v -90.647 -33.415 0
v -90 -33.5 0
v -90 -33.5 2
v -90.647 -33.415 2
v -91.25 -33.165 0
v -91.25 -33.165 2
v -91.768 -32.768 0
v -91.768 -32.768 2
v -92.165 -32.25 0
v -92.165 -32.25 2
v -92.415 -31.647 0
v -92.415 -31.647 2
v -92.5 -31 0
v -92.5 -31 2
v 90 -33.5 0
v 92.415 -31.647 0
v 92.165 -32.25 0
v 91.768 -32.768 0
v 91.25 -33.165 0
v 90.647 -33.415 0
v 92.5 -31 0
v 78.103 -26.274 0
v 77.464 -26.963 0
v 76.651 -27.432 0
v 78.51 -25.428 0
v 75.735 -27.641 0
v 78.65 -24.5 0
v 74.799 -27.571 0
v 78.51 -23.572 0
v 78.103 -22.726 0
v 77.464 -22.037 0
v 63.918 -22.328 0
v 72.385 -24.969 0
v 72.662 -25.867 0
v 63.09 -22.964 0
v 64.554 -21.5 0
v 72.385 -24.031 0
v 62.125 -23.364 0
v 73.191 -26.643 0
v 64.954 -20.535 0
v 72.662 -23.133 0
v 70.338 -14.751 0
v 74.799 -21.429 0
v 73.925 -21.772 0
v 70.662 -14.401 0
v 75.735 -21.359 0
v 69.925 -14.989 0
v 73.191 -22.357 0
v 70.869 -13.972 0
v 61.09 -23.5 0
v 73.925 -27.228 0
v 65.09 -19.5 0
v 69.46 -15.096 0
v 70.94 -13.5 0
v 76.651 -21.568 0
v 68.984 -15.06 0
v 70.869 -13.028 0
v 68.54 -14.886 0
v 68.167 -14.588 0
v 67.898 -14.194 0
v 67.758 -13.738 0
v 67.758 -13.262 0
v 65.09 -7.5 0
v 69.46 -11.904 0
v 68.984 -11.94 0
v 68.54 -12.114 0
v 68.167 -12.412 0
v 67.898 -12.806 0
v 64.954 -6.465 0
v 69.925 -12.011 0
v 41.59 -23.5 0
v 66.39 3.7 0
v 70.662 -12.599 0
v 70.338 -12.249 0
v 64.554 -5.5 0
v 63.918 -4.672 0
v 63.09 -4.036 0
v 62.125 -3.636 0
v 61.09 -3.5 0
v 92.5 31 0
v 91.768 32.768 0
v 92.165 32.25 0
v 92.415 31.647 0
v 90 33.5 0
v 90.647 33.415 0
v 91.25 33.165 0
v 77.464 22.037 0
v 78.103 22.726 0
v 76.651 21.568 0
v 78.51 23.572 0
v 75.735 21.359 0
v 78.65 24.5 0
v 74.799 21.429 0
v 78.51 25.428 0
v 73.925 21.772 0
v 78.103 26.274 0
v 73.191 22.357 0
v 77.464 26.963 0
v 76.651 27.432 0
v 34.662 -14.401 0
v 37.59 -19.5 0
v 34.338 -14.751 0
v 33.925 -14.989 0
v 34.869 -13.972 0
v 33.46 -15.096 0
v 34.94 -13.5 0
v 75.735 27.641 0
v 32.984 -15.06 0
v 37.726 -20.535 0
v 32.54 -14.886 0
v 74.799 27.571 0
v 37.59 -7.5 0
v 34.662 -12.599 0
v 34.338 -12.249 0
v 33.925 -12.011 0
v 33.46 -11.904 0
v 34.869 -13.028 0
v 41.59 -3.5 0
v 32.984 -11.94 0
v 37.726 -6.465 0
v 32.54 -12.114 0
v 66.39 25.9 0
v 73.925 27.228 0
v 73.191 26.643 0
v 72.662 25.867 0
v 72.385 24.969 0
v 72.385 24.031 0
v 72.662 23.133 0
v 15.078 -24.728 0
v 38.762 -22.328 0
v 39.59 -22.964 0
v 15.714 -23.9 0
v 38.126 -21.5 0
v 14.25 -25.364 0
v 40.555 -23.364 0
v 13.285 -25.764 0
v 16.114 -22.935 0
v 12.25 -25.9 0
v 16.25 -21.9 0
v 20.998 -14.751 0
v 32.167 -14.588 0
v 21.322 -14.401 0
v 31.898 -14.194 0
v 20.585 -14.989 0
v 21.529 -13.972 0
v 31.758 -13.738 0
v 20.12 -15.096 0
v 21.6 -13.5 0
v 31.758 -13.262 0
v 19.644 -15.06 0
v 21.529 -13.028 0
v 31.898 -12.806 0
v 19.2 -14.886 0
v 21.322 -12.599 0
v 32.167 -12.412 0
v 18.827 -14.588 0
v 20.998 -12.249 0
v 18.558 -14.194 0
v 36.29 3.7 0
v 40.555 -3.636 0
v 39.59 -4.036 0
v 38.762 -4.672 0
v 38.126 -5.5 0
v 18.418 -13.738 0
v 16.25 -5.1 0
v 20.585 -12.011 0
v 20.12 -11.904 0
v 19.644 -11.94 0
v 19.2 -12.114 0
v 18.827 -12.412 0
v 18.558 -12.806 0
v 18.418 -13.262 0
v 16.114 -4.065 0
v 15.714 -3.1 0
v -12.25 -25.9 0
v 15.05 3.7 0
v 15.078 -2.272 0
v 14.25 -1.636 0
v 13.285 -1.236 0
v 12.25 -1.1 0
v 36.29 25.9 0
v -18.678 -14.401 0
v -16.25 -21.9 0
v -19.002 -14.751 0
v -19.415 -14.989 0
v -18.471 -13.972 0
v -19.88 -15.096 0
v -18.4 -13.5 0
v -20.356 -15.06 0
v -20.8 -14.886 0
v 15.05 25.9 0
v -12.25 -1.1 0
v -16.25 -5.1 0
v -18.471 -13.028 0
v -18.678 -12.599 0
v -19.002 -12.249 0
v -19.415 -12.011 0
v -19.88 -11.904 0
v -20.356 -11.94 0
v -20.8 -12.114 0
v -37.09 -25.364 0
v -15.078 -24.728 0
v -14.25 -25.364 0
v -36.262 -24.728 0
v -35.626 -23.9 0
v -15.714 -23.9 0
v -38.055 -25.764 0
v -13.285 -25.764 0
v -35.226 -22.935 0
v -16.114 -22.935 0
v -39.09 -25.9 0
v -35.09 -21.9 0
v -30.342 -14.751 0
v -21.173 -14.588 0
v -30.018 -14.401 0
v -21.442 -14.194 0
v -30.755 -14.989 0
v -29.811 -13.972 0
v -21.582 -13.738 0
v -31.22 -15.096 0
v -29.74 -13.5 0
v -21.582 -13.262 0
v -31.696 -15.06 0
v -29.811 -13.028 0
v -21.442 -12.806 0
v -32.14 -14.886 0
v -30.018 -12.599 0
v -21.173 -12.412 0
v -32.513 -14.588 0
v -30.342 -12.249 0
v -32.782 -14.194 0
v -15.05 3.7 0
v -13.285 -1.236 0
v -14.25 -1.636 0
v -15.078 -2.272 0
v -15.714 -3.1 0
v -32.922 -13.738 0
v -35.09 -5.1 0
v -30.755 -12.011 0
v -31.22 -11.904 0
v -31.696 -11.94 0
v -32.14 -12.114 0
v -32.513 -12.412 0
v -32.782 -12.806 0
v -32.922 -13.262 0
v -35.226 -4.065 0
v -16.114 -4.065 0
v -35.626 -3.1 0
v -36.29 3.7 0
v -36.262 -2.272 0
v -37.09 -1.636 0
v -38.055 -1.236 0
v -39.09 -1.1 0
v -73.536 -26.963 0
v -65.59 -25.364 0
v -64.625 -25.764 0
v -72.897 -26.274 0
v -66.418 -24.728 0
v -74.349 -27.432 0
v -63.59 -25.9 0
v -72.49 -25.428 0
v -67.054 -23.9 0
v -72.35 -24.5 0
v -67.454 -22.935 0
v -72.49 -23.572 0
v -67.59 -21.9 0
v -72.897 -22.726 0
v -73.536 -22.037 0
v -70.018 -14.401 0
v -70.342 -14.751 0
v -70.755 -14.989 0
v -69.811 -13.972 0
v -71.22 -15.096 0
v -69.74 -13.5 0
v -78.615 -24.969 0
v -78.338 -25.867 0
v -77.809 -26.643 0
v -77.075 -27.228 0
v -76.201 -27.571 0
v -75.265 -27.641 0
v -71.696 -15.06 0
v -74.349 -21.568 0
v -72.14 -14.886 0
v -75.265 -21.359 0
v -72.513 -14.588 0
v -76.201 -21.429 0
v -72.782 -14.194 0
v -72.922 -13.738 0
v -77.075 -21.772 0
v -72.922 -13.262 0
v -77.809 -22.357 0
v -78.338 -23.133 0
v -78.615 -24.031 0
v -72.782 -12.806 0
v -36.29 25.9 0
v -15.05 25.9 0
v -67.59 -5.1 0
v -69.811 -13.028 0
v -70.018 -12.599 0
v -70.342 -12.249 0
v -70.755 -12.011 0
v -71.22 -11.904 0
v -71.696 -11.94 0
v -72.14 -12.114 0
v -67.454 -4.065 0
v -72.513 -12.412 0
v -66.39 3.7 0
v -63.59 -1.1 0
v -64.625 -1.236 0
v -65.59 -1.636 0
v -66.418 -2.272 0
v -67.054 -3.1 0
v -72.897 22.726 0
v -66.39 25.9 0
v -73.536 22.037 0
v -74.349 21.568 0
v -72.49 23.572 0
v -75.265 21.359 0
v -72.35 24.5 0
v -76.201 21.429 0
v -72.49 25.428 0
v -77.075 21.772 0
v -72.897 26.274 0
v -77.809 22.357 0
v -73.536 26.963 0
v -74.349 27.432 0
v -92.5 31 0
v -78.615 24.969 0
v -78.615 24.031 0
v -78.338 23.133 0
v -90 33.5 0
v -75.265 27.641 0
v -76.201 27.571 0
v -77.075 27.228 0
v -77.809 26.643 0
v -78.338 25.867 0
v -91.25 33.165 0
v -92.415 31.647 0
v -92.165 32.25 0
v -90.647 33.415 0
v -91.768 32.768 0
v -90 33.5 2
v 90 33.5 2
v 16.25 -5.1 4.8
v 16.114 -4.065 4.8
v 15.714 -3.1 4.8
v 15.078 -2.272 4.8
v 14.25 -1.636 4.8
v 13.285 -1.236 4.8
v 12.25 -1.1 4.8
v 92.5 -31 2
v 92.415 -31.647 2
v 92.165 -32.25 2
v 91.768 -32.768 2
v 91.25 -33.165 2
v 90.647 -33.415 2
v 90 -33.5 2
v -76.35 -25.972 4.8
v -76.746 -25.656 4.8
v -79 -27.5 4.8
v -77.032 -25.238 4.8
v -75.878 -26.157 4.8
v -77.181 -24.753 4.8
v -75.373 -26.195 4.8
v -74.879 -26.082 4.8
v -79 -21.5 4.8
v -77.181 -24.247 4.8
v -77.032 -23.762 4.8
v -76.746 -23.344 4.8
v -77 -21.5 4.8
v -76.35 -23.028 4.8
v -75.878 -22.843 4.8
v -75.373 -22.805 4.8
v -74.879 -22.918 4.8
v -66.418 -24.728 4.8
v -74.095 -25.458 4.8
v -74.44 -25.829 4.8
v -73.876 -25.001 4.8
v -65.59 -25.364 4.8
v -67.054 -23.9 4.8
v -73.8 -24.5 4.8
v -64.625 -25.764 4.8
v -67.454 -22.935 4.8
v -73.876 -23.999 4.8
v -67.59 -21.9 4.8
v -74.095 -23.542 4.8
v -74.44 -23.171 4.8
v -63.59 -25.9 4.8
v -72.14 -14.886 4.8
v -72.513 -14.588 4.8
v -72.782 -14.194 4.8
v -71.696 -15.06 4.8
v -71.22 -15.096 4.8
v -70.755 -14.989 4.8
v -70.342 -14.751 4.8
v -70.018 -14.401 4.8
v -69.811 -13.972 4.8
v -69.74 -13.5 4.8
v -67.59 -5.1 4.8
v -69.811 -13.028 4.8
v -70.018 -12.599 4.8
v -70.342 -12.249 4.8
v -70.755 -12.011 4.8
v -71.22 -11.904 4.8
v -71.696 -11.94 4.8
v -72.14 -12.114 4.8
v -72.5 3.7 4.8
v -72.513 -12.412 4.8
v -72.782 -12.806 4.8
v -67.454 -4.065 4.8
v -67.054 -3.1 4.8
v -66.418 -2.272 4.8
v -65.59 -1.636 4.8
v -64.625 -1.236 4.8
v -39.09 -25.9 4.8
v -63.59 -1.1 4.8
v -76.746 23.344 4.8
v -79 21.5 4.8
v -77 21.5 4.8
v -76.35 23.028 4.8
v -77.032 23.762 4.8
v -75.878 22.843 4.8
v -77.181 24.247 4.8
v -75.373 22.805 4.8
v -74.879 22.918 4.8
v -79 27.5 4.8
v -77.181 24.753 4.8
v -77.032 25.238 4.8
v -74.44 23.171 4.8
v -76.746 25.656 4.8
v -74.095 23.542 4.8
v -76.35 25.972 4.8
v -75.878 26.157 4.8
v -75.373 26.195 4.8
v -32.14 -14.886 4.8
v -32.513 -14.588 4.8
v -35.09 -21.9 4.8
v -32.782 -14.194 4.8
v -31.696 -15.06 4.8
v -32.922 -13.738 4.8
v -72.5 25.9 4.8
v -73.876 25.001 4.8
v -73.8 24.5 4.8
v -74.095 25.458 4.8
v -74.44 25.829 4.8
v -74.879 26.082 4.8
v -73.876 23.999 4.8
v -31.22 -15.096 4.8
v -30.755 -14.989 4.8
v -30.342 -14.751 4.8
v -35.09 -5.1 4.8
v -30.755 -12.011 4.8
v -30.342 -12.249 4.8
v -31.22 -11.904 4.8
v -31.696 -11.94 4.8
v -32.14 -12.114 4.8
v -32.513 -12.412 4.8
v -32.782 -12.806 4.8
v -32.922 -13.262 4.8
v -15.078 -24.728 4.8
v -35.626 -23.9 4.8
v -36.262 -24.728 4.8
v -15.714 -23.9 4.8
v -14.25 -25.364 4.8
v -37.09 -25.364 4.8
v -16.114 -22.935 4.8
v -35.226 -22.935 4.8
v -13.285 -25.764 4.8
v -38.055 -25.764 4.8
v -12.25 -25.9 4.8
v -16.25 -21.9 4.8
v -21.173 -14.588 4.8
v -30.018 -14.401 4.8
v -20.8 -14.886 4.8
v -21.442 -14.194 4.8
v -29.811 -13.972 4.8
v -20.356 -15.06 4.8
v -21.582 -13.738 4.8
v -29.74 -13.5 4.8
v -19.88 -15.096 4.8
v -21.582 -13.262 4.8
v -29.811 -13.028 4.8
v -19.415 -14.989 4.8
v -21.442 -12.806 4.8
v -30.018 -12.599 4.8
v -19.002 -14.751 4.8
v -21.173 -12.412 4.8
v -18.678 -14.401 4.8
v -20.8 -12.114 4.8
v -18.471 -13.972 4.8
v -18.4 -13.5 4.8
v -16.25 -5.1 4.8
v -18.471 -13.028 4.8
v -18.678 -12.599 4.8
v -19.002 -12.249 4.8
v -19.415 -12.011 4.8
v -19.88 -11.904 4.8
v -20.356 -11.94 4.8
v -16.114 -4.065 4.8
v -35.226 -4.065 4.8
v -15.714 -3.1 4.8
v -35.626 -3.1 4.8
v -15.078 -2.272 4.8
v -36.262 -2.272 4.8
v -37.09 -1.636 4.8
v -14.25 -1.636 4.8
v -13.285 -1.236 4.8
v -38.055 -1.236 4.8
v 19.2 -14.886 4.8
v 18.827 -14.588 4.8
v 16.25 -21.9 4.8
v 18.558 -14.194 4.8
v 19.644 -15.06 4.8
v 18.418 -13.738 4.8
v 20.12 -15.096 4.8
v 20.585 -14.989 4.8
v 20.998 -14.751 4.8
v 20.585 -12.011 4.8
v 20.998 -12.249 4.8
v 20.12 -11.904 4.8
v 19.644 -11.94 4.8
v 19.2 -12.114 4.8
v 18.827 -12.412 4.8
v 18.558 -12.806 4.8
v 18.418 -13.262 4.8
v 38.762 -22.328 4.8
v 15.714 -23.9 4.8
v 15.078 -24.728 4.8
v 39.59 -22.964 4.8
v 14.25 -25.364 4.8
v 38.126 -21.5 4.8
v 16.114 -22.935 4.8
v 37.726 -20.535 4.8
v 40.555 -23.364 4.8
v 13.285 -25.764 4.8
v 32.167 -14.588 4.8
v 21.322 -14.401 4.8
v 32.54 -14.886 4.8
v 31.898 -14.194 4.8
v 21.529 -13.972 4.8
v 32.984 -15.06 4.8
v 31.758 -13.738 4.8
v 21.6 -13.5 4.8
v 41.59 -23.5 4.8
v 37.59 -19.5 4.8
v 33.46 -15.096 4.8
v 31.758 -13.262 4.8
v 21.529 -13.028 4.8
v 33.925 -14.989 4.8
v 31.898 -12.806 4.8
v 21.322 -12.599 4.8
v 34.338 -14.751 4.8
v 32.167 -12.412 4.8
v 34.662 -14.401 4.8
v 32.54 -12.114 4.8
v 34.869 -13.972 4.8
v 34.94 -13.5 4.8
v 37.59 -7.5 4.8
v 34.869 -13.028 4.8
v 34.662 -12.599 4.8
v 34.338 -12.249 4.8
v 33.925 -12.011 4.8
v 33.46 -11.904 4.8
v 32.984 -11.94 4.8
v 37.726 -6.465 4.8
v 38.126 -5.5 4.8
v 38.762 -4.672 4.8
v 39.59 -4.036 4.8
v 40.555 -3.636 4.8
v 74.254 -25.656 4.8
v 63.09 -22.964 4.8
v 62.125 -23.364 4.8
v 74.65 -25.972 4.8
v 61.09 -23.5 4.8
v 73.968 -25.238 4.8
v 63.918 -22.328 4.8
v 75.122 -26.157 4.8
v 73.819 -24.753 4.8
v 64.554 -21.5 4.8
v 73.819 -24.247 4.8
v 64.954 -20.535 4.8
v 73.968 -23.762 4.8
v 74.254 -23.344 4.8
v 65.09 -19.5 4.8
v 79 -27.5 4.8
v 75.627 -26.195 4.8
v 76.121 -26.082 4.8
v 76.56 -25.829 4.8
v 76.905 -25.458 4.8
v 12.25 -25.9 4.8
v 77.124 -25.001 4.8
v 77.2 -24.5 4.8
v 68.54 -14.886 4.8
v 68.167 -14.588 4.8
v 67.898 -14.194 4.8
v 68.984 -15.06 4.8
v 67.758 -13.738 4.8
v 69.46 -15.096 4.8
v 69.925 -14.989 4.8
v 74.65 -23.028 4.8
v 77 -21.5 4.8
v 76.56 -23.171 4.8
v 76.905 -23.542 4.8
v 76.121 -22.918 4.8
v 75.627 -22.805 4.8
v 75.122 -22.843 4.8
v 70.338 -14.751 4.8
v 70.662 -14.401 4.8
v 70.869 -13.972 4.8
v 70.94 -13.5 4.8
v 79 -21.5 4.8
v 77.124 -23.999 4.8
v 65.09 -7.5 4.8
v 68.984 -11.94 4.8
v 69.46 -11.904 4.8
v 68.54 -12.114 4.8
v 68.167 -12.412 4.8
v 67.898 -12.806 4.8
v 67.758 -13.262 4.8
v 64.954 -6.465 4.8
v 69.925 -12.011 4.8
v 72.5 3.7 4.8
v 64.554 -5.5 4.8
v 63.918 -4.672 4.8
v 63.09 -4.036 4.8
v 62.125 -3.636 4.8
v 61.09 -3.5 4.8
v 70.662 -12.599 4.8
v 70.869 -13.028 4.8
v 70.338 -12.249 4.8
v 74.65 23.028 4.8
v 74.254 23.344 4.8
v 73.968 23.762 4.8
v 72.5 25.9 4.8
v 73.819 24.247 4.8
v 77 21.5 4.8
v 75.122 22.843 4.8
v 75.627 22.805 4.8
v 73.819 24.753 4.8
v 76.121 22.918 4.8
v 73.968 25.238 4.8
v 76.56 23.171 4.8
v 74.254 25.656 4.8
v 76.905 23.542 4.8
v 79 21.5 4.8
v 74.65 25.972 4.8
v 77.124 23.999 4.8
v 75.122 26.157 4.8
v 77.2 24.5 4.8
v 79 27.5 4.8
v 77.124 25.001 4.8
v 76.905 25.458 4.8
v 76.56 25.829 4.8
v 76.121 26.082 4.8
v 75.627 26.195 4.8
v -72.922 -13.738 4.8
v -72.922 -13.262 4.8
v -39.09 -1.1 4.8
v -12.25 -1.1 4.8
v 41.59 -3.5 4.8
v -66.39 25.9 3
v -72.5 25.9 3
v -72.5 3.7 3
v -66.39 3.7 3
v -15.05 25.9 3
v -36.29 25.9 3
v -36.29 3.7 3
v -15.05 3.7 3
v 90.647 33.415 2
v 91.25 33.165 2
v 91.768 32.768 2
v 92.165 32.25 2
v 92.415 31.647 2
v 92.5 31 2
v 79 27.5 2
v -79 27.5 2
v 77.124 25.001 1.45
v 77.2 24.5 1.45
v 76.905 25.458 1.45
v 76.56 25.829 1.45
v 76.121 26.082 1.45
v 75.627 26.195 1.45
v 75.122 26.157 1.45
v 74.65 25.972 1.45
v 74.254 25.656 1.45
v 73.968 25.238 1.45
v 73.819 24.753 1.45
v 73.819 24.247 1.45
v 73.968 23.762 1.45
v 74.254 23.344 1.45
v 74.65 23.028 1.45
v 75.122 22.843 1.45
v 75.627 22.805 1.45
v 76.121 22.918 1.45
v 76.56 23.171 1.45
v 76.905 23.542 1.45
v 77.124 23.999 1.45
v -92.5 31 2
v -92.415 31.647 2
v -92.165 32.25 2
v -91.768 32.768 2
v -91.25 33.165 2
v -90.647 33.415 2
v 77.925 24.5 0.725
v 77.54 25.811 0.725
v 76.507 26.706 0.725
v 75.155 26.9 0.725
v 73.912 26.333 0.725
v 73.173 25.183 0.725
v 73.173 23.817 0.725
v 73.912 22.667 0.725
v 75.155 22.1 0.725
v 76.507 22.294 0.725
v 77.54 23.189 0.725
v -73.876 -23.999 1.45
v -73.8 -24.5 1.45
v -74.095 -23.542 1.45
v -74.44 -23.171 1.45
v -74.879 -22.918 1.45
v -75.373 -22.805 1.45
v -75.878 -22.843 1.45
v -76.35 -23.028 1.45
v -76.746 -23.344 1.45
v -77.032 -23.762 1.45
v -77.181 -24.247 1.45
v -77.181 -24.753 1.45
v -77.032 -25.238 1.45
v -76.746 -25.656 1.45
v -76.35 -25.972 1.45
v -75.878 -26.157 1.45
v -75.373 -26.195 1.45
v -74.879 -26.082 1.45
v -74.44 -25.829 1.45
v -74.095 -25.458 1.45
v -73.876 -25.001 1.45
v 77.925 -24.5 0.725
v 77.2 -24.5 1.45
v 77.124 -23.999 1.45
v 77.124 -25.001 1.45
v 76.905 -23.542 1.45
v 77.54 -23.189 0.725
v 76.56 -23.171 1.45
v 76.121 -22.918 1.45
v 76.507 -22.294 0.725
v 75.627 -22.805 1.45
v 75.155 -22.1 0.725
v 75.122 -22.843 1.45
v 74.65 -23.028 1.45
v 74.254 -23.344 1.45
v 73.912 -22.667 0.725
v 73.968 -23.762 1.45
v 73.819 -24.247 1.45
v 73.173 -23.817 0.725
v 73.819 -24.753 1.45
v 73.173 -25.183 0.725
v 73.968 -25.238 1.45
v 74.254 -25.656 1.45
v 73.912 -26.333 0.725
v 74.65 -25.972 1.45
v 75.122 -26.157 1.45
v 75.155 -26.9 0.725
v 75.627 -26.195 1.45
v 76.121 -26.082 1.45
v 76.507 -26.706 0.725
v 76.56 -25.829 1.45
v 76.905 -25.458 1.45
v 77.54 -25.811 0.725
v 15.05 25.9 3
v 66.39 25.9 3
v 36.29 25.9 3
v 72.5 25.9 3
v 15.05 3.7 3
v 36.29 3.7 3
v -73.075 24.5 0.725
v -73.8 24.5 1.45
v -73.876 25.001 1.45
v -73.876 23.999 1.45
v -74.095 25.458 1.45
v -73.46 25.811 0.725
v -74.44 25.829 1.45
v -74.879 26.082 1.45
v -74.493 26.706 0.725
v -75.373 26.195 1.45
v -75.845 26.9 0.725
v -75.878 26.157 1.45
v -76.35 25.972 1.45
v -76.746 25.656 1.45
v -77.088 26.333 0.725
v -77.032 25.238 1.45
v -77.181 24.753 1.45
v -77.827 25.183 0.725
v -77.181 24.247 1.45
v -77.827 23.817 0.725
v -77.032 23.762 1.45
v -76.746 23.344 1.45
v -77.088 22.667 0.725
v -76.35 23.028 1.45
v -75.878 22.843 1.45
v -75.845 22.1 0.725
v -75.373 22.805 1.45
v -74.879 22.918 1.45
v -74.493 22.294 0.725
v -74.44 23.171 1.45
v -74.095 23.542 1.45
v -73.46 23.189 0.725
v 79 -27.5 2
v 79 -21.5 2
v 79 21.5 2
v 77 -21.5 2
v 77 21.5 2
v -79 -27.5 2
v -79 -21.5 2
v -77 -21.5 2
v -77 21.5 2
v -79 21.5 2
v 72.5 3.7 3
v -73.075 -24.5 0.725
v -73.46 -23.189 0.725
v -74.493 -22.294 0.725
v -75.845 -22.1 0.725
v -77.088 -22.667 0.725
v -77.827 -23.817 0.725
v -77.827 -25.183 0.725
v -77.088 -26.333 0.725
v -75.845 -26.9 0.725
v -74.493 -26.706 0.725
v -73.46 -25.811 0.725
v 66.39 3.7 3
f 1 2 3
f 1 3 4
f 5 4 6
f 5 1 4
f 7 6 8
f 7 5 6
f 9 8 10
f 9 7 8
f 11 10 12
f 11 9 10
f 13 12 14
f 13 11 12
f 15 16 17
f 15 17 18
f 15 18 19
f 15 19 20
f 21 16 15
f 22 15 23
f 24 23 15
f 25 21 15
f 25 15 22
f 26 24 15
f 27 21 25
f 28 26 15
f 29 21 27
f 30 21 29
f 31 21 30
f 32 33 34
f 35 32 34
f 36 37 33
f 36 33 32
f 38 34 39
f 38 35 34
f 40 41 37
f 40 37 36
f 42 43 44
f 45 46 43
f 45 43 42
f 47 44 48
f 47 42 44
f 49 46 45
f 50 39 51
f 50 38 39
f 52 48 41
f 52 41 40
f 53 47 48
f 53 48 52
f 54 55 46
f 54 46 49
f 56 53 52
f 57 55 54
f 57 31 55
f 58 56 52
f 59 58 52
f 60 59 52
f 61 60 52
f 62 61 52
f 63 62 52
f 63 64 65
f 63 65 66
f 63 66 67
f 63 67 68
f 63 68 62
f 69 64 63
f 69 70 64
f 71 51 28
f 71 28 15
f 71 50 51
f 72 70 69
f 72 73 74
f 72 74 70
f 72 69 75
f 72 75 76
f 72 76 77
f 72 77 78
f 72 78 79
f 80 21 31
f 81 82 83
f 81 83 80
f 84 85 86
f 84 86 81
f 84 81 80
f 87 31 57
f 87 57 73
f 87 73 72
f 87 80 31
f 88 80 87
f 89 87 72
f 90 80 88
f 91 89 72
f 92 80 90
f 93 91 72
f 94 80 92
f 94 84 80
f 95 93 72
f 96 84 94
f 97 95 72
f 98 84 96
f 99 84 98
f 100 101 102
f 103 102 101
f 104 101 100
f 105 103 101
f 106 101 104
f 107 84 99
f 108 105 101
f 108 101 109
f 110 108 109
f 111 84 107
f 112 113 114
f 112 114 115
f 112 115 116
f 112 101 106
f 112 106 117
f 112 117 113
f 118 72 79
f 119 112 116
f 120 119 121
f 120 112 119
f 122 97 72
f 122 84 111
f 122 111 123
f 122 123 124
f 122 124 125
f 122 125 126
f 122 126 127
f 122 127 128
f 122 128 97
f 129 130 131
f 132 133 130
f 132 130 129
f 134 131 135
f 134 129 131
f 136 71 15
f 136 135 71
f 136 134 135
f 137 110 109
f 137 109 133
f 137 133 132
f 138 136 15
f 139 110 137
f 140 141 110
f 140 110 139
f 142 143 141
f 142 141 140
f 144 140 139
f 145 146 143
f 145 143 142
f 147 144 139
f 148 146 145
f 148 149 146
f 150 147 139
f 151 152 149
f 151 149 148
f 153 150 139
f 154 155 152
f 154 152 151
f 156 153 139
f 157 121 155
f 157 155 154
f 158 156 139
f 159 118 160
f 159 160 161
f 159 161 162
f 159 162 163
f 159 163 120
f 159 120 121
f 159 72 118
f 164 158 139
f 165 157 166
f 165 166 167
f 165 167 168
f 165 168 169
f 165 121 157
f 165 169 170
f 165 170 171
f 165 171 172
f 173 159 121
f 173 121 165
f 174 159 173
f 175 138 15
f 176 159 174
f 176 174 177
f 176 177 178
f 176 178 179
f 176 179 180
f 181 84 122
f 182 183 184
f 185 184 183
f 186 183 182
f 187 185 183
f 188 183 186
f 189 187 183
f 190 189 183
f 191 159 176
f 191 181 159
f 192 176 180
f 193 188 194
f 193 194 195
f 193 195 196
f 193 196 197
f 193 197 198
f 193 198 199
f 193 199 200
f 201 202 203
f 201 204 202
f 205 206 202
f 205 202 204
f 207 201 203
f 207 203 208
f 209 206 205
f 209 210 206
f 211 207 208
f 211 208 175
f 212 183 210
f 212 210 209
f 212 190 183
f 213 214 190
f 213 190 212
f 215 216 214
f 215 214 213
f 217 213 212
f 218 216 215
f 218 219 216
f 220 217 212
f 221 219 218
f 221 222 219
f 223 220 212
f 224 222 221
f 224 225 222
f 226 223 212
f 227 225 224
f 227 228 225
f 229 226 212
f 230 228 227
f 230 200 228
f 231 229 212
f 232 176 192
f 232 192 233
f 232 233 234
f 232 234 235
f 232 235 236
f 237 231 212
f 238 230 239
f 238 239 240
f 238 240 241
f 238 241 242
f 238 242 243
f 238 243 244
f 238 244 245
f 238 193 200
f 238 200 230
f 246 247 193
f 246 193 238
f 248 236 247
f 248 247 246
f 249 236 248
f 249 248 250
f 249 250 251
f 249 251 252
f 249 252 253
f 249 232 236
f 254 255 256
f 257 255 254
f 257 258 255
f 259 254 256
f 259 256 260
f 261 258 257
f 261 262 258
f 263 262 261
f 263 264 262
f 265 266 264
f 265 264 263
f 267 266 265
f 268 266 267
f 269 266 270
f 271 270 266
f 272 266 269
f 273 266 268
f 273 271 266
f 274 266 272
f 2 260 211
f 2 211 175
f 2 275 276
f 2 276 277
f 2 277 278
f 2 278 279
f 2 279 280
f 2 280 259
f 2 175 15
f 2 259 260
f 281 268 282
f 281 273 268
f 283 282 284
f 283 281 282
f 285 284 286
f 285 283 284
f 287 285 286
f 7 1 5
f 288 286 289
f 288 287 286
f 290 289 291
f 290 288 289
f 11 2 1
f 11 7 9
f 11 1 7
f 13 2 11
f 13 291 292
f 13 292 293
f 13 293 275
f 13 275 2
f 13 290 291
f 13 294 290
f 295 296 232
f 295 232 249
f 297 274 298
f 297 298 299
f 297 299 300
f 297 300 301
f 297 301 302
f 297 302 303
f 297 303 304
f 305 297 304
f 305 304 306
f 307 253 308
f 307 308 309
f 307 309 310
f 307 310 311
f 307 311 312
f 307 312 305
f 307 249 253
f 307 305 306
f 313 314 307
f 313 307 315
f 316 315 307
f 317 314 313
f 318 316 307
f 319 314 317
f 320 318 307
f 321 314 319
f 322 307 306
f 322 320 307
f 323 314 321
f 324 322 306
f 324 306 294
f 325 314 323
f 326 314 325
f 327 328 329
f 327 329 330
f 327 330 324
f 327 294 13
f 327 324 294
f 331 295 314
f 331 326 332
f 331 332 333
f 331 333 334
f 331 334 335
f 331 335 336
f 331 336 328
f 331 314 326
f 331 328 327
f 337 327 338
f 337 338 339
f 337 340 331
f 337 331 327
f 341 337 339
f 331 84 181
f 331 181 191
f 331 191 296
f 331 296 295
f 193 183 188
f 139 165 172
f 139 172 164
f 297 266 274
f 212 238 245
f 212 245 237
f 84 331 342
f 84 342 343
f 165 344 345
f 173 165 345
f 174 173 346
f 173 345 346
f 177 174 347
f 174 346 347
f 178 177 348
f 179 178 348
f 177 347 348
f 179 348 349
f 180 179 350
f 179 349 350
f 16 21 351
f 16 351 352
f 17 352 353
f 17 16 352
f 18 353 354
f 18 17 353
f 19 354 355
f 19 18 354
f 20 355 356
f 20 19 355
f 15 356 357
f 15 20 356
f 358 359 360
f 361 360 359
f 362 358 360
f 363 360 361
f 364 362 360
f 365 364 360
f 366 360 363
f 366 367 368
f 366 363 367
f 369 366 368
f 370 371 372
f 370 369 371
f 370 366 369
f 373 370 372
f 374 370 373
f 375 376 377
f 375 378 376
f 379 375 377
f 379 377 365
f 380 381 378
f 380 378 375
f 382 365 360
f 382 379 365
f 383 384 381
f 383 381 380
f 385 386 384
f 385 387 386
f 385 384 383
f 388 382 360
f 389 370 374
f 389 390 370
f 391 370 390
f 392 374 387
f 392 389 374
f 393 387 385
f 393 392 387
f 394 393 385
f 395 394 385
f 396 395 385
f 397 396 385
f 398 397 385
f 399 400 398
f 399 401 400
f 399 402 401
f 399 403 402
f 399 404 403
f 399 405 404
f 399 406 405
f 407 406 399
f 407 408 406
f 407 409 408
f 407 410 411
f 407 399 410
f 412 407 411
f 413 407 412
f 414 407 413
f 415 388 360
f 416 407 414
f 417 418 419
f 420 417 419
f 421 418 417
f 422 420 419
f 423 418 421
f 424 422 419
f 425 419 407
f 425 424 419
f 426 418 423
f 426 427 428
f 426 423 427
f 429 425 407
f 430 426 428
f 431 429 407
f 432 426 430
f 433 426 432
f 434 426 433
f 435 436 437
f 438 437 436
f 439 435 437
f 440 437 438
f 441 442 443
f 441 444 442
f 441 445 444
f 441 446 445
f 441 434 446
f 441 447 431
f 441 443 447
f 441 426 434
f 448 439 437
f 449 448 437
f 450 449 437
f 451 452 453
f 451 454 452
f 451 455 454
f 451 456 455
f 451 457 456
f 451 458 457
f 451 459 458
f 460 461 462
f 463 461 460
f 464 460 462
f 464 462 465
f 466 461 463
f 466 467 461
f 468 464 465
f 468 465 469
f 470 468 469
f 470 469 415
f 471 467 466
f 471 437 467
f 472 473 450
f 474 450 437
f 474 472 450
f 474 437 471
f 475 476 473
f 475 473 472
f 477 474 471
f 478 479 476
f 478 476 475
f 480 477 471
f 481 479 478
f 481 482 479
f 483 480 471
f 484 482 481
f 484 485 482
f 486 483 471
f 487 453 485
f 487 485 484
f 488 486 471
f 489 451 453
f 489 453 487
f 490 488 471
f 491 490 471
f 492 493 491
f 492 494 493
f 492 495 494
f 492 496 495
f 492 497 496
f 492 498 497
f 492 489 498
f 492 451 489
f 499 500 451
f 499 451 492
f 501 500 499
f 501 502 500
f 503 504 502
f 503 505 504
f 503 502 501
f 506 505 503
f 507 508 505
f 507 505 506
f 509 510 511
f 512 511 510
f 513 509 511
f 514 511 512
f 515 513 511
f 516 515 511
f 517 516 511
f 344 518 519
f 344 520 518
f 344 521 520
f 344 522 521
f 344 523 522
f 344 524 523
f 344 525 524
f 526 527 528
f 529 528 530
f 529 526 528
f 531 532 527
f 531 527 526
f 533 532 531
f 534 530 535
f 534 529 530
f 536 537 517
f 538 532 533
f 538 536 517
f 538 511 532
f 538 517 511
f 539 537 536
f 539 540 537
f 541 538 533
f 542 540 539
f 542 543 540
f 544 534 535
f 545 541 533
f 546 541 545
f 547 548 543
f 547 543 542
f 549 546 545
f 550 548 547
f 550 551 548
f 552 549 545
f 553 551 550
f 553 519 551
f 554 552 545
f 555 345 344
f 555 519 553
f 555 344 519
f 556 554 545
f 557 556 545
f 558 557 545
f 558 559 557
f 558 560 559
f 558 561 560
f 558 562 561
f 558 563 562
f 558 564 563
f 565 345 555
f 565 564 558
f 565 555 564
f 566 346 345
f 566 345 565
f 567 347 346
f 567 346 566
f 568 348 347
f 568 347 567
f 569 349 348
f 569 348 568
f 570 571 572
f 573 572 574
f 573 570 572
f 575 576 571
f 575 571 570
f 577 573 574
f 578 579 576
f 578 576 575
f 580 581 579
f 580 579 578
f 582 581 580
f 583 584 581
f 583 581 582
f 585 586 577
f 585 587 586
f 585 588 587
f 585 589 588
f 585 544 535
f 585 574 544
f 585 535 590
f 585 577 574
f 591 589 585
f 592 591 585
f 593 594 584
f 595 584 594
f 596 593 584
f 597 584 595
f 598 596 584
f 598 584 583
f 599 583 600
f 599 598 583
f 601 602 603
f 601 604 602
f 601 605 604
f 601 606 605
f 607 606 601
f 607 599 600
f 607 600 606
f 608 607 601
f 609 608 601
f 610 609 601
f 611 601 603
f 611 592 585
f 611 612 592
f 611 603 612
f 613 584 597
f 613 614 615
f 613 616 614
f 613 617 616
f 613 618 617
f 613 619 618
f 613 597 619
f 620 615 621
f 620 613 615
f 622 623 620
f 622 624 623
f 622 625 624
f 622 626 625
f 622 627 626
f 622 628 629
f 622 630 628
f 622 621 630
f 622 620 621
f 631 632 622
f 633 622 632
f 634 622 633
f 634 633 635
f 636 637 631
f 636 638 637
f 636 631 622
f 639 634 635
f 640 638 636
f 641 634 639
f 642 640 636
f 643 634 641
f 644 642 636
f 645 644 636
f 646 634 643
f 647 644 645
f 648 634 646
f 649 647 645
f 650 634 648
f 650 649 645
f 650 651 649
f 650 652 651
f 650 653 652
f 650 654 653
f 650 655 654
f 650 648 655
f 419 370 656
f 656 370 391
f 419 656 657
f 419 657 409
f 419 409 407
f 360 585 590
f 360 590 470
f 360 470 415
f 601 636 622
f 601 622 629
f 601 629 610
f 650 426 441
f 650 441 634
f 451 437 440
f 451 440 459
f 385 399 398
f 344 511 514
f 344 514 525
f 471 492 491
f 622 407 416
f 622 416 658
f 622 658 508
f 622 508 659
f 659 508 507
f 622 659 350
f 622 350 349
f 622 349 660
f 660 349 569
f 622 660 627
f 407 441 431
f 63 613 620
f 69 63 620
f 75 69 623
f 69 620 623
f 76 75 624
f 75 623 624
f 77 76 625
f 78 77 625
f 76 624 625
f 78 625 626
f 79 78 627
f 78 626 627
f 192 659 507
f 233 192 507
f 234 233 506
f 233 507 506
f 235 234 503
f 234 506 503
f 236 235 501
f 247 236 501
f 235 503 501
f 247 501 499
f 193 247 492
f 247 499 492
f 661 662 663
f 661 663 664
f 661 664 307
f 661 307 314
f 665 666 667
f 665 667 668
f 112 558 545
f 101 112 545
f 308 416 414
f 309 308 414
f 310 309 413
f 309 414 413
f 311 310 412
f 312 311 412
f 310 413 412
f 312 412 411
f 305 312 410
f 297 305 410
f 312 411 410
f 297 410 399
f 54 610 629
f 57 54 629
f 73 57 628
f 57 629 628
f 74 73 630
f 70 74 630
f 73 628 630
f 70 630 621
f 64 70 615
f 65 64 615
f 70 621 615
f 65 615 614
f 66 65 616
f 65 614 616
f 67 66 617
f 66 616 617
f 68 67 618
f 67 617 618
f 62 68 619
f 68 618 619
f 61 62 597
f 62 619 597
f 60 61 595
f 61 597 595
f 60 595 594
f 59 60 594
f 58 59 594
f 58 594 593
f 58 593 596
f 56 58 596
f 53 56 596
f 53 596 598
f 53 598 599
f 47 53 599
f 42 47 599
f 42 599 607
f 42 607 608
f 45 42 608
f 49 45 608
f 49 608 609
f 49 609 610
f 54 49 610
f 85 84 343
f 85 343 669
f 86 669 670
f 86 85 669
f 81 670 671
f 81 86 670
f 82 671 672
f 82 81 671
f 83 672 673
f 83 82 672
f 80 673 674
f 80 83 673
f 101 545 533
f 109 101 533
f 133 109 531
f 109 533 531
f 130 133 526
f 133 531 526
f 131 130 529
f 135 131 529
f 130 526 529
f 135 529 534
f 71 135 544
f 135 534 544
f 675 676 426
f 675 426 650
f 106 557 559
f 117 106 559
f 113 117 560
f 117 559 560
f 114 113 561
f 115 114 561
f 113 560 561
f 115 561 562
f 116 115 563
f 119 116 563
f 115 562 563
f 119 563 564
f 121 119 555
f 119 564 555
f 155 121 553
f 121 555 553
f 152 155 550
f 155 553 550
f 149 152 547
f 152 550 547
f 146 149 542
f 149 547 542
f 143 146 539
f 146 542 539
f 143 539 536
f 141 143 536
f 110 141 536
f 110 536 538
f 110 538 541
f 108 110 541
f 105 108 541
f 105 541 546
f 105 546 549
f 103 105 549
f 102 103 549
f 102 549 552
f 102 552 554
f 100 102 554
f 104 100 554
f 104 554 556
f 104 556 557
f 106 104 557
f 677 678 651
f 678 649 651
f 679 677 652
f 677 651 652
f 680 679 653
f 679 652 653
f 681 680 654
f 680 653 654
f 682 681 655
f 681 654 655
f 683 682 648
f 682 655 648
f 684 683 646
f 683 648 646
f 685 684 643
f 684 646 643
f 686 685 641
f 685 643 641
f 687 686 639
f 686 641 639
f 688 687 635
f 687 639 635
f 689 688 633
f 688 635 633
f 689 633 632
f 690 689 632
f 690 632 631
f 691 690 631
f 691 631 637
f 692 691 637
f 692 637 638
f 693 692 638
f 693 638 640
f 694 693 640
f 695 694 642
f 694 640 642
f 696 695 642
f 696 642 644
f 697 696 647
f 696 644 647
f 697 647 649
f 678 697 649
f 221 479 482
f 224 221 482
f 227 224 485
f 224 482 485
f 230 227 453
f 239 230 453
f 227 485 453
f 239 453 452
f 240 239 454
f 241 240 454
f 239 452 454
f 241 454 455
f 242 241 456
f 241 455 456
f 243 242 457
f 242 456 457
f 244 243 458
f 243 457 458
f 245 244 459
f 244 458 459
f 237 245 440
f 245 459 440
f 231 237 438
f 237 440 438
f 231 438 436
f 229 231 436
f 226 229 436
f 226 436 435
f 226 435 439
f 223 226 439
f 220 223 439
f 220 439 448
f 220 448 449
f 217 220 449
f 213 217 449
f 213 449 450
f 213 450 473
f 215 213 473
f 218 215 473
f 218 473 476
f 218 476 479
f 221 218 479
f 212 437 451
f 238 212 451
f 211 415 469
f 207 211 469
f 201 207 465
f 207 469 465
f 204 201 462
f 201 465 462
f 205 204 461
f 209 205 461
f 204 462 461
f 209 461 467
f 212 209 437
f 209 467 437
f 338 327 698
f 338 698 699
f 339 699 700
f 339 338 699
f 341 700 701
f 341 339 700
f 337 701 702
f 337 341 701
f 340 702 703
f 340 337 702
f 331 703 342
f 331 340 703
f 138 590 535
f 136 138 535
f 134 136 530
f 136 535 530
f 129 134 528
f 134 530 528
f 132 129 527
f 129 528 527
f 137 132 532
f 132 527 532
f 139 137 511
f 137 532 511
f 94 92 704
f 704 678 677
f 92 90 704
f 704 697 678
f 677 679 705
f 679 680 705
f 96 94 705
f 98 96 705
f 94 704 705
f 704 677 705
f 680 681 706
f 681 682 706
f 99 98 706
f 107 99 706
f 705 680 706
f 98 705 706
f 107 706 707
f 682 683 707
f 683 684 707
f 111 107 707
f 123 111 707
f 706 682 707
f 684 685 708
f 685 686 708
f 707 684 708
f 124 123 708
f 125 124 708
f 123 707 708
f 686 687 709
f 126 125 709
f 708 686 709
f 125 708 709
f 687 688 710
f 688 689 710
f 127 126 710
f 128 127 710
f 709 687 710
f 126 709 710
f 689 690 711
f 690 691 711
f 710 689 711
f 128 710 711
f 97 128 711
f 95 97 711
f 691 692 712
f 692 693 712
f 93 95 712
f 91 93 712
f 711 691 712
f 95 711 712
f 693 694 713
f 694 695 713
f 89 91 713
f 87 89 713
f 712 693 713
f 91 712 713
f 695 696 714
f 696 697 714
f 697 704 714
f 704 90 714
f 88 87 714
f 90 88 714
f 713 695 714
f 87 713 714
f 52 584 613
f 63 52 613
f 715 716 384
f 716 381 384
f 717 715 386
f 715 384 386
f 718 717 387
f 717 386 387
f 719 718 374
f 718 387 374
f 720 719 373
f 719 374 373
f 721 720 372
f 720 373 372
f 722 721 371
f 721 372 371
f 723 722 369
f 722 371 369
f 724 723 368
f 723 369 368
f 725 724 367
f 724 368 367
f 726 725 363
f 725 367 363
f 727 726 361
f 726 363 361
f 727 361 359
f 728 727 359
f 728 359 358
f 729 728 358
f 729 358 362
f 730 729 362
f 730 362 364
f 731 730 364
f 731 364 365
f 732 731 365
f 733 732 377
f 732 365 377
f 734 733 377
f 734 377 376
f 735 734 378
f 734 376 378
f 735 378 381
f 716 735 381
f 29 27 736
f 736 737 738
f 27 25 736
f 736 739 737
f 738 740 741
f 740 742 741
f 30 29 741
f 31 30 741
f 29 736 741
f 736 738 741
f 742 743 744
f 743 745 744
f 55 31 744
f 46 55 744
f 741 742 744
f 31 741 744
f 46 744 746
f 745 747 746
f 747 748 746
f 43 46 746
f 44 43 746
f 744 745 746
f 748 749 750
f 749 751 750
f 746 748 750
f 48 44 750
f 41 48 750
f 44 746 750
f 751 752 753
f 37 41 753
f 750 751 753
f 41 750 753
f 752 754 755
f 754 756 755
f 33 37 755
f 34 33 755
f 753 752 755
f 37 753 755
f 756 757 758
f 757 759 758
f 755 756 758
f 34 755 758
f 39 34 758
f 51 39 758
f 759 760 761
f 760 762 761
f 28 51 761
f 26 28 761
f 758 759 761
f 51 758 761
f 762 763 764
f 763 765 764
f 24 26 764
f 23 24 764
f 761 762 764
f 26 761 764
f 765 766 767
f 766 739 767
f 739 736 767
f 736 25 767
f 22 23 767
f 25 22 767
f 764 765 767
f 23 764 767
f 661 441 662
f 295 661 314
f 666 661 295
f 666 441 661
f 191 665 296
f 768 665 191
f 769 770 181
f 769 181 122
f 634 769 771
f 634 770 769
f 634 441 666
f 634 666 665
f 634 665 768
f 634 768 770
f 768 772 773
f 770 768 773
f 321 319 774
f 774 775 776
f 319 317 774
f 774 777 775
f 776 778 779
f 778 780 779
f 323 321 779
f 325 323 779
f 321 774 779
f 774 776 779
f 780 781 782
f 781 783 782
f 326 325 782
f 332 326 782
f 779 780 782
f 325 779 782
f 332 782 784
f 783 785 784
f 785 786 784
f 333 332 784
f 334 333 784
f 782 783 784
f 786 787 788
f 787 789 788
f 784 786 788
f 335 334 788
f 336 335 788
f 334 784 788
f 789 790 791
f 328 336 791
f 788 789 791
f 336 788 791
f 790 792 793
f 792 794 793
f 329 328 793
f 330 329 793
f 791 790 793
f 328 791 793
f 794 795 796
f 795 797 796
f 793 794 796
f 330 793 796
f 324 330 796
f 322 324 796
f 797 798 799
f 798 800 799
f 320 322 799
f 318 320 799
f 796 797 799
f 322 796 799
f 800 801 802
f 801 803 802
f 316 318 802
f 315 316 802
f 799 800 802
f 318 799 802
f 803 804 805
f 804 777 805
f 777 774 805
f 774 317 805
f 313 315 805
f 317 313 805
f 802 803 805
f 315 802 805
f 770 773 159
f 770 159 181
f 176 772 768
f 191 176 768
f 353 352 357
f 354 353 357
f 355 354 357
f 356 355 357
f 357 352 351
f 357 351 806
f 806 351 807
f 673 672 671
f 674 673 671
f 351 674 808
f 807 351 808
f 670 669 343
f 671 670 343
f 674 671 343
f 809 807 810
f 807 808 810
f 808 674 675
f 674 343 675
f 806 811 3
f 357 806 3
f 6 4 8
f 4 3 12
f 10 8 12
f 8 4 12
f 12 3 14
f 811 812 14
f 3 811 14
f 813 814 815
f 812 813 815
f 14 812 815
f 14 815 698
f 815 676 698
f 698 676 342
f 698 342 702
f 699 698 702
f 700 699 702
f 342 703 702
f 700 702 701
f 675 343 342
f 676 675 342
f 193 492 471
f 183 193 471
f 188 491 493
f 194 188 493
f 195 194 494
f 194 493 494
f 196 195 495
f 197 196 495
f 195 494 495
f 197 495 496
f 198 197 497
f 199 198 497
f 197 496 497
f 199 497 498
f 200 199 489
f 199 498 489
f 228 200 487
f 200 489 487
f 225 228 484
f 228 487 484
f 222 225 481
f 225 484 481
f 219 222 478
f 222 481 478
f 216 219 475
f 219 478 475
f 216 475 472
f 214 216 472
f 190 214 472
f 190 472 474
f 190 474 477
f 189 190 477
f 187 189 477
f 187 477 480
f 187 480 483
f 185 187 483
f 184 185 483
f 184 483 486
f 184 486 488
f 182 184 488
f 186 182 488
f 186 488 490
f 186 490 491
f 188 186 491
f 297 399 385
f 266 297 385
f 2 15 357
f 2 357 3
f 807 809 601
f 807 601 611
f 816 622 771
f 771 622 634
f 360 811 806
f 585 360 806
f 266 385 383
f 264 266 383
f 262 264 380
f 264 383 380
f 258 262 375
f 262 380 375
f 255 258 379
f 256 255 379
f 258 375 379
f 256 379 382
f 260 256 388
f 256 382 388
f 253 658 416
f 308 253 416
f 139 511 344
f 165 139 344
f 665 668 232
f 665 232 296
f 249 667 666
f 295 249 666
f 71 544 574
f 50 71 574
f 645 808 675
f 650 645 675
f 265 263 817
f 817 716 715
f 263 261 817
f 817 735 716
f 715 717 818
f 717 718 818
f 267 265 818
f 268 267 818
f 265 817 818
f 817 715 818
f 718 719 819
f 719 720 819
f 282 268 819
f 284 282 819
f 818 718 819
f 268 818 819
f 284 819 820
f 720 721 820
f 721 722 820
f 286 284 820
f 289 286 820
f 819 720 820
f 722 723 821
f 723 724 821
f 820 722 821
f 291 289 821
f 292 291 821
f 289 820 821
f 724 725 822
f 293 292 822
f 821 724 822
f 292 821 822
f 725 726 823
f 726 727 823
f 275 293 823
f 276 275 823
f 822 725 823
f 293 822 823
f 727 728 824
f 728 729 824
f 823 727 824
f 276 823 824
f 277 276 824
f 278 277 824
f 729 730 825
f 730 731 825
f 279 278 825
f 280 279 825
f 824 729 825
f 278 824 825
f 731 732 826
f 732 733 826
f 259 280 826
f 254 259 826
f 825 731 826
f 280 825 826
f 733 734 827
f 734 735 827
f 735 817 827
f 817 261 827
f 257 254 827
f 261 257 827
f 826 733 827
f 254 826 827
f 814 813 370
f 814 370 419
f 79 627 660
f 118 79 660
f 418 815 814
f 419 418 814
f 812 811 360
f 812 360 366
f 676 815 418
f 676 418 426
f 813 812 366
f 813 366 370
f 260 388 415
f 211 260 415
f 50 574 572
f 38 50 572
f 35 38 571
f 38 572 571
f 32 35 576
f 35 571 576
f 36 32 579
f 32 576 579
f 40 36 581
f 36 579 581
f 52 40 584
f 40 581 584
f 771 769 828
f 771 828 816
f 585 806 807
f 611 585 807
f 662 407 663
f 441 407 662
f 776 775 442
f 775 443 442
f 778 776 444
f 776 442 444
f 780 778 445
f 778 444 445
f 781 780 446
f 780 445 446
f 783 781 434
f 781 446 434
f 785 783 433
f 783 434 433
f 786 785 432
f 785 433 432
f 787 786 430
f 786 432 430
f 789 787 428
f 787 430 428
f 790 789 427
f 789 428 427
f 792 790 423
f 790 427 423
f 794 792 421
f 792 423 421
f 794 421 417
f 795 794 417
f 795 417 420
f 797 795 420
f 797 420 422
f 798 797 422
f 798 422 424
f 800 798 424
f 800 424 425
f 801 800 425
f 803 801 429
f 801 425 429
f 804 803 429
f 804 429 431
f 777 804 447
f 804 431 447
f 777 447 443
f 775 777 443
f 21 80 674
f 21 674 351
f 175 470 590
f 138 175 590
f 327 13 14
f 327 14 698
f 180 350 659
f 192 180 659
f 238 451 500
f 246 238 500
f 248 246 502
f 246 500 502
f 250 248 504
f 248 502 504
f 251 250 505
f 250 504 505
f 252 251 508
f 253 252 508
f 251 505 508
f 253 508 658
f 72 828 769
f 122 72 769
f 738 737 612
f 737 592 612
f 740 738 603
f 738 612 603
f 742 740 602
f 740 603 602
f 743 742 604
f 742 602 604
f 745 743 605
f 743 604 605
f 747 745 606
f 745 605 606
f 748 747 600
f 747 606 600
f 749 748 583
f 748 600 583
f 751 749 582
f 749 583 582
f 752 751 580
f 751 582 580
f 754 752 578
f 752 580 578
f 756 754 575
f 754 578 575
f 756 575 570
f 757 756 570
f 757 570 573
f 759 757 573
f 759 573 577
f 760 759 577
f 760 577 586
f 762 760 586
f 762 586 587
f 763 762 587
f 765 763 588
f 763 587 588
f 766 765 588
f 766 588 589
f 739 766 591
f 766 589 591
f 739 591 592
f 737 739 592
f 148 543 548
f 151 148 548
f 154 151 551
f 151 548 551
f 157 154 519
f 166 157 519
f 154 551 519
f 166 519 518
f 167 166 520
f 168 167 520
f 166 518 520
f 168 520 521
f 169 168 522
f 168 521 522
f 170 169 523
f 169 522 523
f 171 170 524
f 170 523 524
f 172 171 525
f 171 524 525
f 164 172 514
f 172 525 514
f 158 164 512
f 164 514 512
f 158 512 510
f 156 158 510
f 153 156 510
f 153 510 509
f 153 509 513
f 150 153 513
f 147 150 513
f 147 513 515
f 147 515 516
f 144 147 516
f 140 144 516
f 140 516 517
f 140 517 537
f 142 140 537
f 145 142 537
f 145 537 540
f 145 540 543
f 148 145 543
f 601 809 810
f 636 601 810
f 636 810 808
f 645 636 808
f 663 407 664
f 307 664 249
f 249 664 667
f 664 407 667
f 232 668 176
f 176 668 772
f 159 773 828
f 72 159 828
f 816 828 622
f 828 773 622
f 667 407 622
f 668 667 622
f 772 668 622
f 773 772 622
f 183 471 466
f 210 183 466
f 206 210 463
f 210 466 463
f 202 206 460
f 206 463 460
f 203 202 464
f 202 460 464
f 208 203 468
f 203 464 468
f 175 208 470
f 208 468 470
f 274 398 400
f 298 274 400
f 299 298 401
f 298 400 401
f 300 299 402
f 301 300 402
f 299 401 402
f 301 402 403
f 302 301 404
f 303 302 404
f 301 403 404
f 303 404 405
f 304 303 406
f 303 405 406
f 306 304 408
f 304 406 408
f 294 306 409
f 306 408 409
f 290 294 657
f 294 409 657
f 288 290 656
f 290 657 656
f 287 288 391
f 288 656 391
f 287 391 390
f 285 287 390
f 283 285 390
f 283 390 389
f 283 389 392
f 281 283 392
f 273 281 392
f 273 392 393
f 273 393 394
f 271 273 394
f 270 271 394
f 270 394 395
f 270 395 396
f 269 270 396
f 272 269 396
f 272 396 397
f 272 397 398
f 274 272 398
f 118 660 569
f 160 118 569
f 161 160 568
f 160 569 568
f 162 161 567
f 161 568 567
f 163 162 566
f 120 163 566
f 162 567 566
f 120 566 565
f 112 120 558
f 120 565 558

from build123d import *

# Parameters (mm, degrees)
P_IDAT_VYSUNUT_M1_DEPTH                           = 2
SKICA2_W                                          = 154
SKICA2_H                                          = 55
P_IDAT_VYSUNUT_M2_DEPTH                           = 2.8
SKICA3_R                                          = 1.6
SKICA3_W                                          = 30.1
SKICA3_H                                          = 22.2
ODEBRAT_VYSUNUT_M1_DEPTH                          = 5.8
SKICA4_W                                          = 145
SKICA4_H                                          = 22.2
ODEBRAT_VYSUNUT_M2_DEPTH                          = 1.8
SKICA5_W                                          = 2
SKICA5_H                                          = 6
P_IDAT_VYSUNUT_M3_DEPTH                           = 2.8
KU_ELOV_ZAHLOUBEN_PRO_M3_ROUBU_SE_Z_P_D           = 3.4
KU_ELOV_ZAHLOUBEN_PRO_M3_ROUBU_SE_Z_P_CSINK_D     = 6.3
KU_ELOV_ZAHLOUBEN_PRO_M3_ROUBU_SE_Z_P_CSINK_ANGLE = 90


with BuildPart() as part:
    # Skica1 → Přidat vysunutím1 (new body)
    with BuildSketch(Plane.XY):
        with BuildLine():
            Line((-90, 33.5), (90, 33.5))
            ThreePointArc((90, 33.5), (91.767766953, 32.767766953), (92.5, 31))
            Line((92.5, 31), (92.5, -31))
            ThreePointArc((92.5, -31), (91.767766953, -32.767766953), (90, -33.5))
            Line((90, -33.5), (-90, -33.5))
            ThreePointArc((-90, -33.5), (-91.767766953, -32.767766953), (-92.5, -31))
            Line((-92.5, -31), (-92.5, 31))
            ThreePointArc((-92.5, 31), (-91.767766953, 32.767766953), (-90, 33.5))
        make_face()
    extrude(amount=P_IDAT_VYSUNUT_M1_DEPTH)

    # Skica2 → Přidat vysunutím2 (add)
    with BuildSketch(Plane.XY.offset(2)):
        Rectangle(SKICA2_W, SKICA2_H)
    extrude(amount=P_IDAT_VYSUNUT_M2_DEPTH)

    # Skica3 → Odebrat vysunutím1 (cut, through all)
    with BuildSketch(Plane.XY.offset(4.8)):
        with Locations((-20, -13.5)):
            Circle(SKICA3_R)
        with Locations((20, -13.5)):
            Circle(SKICA3_R)
        with Locations((33.34, -13.5)):
            Circle(SKICA3_R)
        with Locations((69.34, -13.5)):
            Circle(SKICA3_R)
        with Locations((-31.34, -13.5)):
            Circle(SKICA3_R)
        with Locations((-71.34, -13.5)):
            Circle(SKICA3_R)
        with BuildLine():
            Line((-39.09, -1.1), (-63.59, -1.1))
            ThreePointArc((-63.59, -1.1), (-66.418427125, -2.271572875), (-67.59, -5.1))
            Line((-67.59, -5.1), (-67.59, -21.9))
            ThreePointArc((-67.59, -21.9), (-66.418427125, -24.728427125), (-63.59, -25.9))
            Line((-63.59, -25.9), (-39.09, -25.9))
            ThreePointArc((-39.09, -25.9), (-36.261572875, -24.728427125), (-35.09, -21.9))
            Line((-35.09, -21.9), (-35.09, -5.1))
            ThreePointArc((-35.09, -5.1), (-36.261572875, -2.271572875), (-39.09, -1.1))
        make_face()
        with BuildLine():
            Line((12.25, -1.1), (-12.25, -1.1))
            ThreePointArc((-12.25, -1.1), (-15.078427125, -2.271572875), (-16.25, -5.1))
            Line((-16.25, -5.1), (-16.25, -21.9))
            ThreePointArc((-16.25, -21.9), (-15.078427125, -24.728427125), (-12.25, -25.9))
            Line((-12.25, -25.9), (12.25, -25.9))
            ThreePointArc((12.25, -25.9), (15.078427125, -24.728427125), (16.25, -21.9))
            Line((16.25, -21.9), (16.25, -5.1))
            ThreePointArc((16.25, -5.1), (15.078427125, -2.271572875), (12.25, -1.1))
        make_face()
        with BuildLine():
            Line((61.09, -3.5), (41.59, -3.5))
            ThreePointArc((41.59, -3.5), (38.761572875, -4.671572875), (37.59, -7.5))
            Line((37.59, -7.5), (37.59, -19.5))
            ThreePointArc((37.59, -19.5), (38.761572875, -22.328427125), (41.59, -23.5))
            Line((41.59, -23.5), (61.09, -23.5))
            ThreePointArc((61.09, -23.5), (63.918427125, -22.328427125), (65.09, -19.5))
            Line((65.09, -19.5), (65.09, -7.5))
            ThreePointArc((65.09, -7.5), (63.918427125, -4.671572875), (61.09, -3.5))
        make_face()
        with Locations((-51.34, 14.8)):
            Rectangle(SKICA3_W, SKICA3_H)
        with Locations((0, 14.8)):
            Rectangle(SKICA3_W, SKICA3_H)
        with Locations((51.34, 14.8)):
            Rectangle(SKICA3_W, SKICA3_H)
    extrude(amount=-ODEBRAT_VYSUNUT_M1_DEPTH, mode=Mode.SUBTRACT)

    # Skica4 → Odebrat vysunutím2 (cut)
    with BuildSketch(Plane.XY.offset(4.8)):
        with Locations((0, 14.8)):
            Rectangle(SKICA4_W, SKICA4_H)
    extrude(amount=-ODEBRAT_VYSUNUT_M2_DEPTH, mode=Mode.SUBTRACT)

    # Skica5 → Přidat vysunutím3 (add)
    with BuildSketch(Plane.XY.offset(2)):
        with Locations((-78, 24.5)):
            Rectangle(SKICA5_W, SKICA5_H)
        with Locations((-78, -24.5)):
            Rectangle(SKICA5_W, SKICA5_H)
        with Locations((78, -24.5)):
            Rectangle(SKICA5_W, SKICA5_H)
        with Locations((78, 24.5)):
            Rectangle(SKICA5_W, SKICA5_H)
    extrude(amount=P_IDAT_VYSUNUT_M3_DEPTH)

    # Kuželové zahloubení pro M3 šroubu se zápustnou hlavou plochou1 (through all)
    with Locations(Plane(origin=(0, 0, 0), x_dir=(-1, 0, 0), z_dir=(0, 0, -1))):
        with Locations((-75.5, -24.5), (-75.5, 24.5), (75.5, 24.5), (75.5, -24.5)):
            CounterSinkHole(KU_ELOV_ZAHLOUBEN_PRO_M3_ROUBU_SE_Z_P_D / 2, KU_ELOV_ZAHLOUBEN_PRO_M3_ROUBU_SE_Z_P_CSINK_D / 2, counter_sink_angle=KU_ELOV_ZAHLOUBEN_PRO_M3_ROUBU_SE_Z_P_CSINK_ANGLE)


solid = part.part
